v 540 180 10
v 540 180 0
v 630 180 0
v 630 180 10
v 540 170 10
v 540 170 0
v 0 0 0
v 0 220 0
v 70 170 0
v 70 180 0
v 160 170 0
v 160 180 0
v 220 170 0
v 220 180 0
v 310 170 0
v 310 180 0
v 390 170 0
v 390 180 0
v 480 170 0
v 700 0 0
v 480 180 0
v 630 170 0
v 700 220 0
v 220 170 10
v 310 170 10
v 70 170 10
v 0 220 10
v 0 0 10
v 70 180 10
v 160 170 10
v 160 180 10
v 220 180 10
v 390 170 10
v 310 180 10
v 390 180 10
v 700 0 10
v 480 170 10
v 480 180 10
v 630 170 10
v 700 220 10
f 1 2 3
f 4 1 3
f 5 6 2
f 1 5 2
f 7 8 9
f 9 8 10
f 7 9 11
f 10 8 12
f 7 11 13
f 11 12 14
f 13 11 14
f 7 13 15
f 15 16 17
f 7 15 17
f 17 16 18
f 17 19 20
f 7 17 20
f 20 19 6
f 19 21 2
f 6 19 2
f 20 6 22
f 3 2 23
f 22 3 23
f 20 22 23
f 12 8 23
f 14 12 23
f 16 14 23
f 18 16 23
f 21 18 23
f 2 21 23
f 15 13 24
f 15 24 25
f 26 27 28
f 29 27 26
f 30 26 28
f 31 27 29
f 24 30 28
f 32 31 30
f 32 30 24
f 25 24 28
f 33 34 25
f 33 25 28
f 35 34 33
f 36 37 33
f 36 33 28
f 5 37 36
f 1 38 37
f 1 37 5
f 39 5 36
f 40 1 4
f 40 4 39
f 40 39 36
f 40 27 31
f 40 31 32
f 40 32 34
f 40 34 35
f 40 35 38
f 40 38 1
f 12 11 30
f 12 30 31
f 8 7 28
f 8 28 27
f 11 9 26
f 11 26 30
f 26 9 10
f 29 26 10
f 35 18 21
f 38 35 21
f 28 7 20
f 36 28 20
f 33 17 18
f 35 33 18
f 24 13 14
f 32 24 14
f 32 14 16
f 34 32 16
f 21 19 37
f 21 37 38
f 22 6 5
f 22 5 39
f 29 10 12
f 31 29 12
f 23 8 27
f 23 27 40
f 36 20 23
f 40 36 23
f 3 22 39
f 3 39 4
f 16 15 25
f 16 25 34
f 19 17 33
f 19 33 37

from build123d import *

# Parameters (mm, degrees)
ESQUISSE1_W        = 700
ESQUISSE1_H        = 220
ESQUISSE1_W_2      = 90
ESQUISSE1_H_2      = 10
BOSS_EXTRU_1_DEPTH = 10


with BuildPart() as part:
    # Esquisse1 → Boss.-Extru.1 (new body)
    with BuildSketch(Plane.XY):
        with Locations((350, 110)):
            Rectangle(ESQUISSE1_W, ESQUISSE1_H)
        with Locations((265, 175)):
            Rectangle(ESQUISSE1_W_2, ESQUISSE1_H_2, mode=Mode.SUBTRACT)
        with Locations((435, 175)):
            Rectangle(ESQUISSE1_W_2, ESQUISSE1_H_2, mode=Mode.SUBTRACT)
        with Locations((585, 175)):
            Rectangle(ESQUISSE1_W_2, ESQUISSE1_H_2, mode=Mode.SUBTRACT)
        with Locations((115, 175)):
            Rectangle(ESQUISSE1_W_2, ESQUISSE1_H_2, mode=Mode.SUBTRACT)
    extrude(amount=BOSS_EXTRU_1_DEPTH)


solid = part.part
